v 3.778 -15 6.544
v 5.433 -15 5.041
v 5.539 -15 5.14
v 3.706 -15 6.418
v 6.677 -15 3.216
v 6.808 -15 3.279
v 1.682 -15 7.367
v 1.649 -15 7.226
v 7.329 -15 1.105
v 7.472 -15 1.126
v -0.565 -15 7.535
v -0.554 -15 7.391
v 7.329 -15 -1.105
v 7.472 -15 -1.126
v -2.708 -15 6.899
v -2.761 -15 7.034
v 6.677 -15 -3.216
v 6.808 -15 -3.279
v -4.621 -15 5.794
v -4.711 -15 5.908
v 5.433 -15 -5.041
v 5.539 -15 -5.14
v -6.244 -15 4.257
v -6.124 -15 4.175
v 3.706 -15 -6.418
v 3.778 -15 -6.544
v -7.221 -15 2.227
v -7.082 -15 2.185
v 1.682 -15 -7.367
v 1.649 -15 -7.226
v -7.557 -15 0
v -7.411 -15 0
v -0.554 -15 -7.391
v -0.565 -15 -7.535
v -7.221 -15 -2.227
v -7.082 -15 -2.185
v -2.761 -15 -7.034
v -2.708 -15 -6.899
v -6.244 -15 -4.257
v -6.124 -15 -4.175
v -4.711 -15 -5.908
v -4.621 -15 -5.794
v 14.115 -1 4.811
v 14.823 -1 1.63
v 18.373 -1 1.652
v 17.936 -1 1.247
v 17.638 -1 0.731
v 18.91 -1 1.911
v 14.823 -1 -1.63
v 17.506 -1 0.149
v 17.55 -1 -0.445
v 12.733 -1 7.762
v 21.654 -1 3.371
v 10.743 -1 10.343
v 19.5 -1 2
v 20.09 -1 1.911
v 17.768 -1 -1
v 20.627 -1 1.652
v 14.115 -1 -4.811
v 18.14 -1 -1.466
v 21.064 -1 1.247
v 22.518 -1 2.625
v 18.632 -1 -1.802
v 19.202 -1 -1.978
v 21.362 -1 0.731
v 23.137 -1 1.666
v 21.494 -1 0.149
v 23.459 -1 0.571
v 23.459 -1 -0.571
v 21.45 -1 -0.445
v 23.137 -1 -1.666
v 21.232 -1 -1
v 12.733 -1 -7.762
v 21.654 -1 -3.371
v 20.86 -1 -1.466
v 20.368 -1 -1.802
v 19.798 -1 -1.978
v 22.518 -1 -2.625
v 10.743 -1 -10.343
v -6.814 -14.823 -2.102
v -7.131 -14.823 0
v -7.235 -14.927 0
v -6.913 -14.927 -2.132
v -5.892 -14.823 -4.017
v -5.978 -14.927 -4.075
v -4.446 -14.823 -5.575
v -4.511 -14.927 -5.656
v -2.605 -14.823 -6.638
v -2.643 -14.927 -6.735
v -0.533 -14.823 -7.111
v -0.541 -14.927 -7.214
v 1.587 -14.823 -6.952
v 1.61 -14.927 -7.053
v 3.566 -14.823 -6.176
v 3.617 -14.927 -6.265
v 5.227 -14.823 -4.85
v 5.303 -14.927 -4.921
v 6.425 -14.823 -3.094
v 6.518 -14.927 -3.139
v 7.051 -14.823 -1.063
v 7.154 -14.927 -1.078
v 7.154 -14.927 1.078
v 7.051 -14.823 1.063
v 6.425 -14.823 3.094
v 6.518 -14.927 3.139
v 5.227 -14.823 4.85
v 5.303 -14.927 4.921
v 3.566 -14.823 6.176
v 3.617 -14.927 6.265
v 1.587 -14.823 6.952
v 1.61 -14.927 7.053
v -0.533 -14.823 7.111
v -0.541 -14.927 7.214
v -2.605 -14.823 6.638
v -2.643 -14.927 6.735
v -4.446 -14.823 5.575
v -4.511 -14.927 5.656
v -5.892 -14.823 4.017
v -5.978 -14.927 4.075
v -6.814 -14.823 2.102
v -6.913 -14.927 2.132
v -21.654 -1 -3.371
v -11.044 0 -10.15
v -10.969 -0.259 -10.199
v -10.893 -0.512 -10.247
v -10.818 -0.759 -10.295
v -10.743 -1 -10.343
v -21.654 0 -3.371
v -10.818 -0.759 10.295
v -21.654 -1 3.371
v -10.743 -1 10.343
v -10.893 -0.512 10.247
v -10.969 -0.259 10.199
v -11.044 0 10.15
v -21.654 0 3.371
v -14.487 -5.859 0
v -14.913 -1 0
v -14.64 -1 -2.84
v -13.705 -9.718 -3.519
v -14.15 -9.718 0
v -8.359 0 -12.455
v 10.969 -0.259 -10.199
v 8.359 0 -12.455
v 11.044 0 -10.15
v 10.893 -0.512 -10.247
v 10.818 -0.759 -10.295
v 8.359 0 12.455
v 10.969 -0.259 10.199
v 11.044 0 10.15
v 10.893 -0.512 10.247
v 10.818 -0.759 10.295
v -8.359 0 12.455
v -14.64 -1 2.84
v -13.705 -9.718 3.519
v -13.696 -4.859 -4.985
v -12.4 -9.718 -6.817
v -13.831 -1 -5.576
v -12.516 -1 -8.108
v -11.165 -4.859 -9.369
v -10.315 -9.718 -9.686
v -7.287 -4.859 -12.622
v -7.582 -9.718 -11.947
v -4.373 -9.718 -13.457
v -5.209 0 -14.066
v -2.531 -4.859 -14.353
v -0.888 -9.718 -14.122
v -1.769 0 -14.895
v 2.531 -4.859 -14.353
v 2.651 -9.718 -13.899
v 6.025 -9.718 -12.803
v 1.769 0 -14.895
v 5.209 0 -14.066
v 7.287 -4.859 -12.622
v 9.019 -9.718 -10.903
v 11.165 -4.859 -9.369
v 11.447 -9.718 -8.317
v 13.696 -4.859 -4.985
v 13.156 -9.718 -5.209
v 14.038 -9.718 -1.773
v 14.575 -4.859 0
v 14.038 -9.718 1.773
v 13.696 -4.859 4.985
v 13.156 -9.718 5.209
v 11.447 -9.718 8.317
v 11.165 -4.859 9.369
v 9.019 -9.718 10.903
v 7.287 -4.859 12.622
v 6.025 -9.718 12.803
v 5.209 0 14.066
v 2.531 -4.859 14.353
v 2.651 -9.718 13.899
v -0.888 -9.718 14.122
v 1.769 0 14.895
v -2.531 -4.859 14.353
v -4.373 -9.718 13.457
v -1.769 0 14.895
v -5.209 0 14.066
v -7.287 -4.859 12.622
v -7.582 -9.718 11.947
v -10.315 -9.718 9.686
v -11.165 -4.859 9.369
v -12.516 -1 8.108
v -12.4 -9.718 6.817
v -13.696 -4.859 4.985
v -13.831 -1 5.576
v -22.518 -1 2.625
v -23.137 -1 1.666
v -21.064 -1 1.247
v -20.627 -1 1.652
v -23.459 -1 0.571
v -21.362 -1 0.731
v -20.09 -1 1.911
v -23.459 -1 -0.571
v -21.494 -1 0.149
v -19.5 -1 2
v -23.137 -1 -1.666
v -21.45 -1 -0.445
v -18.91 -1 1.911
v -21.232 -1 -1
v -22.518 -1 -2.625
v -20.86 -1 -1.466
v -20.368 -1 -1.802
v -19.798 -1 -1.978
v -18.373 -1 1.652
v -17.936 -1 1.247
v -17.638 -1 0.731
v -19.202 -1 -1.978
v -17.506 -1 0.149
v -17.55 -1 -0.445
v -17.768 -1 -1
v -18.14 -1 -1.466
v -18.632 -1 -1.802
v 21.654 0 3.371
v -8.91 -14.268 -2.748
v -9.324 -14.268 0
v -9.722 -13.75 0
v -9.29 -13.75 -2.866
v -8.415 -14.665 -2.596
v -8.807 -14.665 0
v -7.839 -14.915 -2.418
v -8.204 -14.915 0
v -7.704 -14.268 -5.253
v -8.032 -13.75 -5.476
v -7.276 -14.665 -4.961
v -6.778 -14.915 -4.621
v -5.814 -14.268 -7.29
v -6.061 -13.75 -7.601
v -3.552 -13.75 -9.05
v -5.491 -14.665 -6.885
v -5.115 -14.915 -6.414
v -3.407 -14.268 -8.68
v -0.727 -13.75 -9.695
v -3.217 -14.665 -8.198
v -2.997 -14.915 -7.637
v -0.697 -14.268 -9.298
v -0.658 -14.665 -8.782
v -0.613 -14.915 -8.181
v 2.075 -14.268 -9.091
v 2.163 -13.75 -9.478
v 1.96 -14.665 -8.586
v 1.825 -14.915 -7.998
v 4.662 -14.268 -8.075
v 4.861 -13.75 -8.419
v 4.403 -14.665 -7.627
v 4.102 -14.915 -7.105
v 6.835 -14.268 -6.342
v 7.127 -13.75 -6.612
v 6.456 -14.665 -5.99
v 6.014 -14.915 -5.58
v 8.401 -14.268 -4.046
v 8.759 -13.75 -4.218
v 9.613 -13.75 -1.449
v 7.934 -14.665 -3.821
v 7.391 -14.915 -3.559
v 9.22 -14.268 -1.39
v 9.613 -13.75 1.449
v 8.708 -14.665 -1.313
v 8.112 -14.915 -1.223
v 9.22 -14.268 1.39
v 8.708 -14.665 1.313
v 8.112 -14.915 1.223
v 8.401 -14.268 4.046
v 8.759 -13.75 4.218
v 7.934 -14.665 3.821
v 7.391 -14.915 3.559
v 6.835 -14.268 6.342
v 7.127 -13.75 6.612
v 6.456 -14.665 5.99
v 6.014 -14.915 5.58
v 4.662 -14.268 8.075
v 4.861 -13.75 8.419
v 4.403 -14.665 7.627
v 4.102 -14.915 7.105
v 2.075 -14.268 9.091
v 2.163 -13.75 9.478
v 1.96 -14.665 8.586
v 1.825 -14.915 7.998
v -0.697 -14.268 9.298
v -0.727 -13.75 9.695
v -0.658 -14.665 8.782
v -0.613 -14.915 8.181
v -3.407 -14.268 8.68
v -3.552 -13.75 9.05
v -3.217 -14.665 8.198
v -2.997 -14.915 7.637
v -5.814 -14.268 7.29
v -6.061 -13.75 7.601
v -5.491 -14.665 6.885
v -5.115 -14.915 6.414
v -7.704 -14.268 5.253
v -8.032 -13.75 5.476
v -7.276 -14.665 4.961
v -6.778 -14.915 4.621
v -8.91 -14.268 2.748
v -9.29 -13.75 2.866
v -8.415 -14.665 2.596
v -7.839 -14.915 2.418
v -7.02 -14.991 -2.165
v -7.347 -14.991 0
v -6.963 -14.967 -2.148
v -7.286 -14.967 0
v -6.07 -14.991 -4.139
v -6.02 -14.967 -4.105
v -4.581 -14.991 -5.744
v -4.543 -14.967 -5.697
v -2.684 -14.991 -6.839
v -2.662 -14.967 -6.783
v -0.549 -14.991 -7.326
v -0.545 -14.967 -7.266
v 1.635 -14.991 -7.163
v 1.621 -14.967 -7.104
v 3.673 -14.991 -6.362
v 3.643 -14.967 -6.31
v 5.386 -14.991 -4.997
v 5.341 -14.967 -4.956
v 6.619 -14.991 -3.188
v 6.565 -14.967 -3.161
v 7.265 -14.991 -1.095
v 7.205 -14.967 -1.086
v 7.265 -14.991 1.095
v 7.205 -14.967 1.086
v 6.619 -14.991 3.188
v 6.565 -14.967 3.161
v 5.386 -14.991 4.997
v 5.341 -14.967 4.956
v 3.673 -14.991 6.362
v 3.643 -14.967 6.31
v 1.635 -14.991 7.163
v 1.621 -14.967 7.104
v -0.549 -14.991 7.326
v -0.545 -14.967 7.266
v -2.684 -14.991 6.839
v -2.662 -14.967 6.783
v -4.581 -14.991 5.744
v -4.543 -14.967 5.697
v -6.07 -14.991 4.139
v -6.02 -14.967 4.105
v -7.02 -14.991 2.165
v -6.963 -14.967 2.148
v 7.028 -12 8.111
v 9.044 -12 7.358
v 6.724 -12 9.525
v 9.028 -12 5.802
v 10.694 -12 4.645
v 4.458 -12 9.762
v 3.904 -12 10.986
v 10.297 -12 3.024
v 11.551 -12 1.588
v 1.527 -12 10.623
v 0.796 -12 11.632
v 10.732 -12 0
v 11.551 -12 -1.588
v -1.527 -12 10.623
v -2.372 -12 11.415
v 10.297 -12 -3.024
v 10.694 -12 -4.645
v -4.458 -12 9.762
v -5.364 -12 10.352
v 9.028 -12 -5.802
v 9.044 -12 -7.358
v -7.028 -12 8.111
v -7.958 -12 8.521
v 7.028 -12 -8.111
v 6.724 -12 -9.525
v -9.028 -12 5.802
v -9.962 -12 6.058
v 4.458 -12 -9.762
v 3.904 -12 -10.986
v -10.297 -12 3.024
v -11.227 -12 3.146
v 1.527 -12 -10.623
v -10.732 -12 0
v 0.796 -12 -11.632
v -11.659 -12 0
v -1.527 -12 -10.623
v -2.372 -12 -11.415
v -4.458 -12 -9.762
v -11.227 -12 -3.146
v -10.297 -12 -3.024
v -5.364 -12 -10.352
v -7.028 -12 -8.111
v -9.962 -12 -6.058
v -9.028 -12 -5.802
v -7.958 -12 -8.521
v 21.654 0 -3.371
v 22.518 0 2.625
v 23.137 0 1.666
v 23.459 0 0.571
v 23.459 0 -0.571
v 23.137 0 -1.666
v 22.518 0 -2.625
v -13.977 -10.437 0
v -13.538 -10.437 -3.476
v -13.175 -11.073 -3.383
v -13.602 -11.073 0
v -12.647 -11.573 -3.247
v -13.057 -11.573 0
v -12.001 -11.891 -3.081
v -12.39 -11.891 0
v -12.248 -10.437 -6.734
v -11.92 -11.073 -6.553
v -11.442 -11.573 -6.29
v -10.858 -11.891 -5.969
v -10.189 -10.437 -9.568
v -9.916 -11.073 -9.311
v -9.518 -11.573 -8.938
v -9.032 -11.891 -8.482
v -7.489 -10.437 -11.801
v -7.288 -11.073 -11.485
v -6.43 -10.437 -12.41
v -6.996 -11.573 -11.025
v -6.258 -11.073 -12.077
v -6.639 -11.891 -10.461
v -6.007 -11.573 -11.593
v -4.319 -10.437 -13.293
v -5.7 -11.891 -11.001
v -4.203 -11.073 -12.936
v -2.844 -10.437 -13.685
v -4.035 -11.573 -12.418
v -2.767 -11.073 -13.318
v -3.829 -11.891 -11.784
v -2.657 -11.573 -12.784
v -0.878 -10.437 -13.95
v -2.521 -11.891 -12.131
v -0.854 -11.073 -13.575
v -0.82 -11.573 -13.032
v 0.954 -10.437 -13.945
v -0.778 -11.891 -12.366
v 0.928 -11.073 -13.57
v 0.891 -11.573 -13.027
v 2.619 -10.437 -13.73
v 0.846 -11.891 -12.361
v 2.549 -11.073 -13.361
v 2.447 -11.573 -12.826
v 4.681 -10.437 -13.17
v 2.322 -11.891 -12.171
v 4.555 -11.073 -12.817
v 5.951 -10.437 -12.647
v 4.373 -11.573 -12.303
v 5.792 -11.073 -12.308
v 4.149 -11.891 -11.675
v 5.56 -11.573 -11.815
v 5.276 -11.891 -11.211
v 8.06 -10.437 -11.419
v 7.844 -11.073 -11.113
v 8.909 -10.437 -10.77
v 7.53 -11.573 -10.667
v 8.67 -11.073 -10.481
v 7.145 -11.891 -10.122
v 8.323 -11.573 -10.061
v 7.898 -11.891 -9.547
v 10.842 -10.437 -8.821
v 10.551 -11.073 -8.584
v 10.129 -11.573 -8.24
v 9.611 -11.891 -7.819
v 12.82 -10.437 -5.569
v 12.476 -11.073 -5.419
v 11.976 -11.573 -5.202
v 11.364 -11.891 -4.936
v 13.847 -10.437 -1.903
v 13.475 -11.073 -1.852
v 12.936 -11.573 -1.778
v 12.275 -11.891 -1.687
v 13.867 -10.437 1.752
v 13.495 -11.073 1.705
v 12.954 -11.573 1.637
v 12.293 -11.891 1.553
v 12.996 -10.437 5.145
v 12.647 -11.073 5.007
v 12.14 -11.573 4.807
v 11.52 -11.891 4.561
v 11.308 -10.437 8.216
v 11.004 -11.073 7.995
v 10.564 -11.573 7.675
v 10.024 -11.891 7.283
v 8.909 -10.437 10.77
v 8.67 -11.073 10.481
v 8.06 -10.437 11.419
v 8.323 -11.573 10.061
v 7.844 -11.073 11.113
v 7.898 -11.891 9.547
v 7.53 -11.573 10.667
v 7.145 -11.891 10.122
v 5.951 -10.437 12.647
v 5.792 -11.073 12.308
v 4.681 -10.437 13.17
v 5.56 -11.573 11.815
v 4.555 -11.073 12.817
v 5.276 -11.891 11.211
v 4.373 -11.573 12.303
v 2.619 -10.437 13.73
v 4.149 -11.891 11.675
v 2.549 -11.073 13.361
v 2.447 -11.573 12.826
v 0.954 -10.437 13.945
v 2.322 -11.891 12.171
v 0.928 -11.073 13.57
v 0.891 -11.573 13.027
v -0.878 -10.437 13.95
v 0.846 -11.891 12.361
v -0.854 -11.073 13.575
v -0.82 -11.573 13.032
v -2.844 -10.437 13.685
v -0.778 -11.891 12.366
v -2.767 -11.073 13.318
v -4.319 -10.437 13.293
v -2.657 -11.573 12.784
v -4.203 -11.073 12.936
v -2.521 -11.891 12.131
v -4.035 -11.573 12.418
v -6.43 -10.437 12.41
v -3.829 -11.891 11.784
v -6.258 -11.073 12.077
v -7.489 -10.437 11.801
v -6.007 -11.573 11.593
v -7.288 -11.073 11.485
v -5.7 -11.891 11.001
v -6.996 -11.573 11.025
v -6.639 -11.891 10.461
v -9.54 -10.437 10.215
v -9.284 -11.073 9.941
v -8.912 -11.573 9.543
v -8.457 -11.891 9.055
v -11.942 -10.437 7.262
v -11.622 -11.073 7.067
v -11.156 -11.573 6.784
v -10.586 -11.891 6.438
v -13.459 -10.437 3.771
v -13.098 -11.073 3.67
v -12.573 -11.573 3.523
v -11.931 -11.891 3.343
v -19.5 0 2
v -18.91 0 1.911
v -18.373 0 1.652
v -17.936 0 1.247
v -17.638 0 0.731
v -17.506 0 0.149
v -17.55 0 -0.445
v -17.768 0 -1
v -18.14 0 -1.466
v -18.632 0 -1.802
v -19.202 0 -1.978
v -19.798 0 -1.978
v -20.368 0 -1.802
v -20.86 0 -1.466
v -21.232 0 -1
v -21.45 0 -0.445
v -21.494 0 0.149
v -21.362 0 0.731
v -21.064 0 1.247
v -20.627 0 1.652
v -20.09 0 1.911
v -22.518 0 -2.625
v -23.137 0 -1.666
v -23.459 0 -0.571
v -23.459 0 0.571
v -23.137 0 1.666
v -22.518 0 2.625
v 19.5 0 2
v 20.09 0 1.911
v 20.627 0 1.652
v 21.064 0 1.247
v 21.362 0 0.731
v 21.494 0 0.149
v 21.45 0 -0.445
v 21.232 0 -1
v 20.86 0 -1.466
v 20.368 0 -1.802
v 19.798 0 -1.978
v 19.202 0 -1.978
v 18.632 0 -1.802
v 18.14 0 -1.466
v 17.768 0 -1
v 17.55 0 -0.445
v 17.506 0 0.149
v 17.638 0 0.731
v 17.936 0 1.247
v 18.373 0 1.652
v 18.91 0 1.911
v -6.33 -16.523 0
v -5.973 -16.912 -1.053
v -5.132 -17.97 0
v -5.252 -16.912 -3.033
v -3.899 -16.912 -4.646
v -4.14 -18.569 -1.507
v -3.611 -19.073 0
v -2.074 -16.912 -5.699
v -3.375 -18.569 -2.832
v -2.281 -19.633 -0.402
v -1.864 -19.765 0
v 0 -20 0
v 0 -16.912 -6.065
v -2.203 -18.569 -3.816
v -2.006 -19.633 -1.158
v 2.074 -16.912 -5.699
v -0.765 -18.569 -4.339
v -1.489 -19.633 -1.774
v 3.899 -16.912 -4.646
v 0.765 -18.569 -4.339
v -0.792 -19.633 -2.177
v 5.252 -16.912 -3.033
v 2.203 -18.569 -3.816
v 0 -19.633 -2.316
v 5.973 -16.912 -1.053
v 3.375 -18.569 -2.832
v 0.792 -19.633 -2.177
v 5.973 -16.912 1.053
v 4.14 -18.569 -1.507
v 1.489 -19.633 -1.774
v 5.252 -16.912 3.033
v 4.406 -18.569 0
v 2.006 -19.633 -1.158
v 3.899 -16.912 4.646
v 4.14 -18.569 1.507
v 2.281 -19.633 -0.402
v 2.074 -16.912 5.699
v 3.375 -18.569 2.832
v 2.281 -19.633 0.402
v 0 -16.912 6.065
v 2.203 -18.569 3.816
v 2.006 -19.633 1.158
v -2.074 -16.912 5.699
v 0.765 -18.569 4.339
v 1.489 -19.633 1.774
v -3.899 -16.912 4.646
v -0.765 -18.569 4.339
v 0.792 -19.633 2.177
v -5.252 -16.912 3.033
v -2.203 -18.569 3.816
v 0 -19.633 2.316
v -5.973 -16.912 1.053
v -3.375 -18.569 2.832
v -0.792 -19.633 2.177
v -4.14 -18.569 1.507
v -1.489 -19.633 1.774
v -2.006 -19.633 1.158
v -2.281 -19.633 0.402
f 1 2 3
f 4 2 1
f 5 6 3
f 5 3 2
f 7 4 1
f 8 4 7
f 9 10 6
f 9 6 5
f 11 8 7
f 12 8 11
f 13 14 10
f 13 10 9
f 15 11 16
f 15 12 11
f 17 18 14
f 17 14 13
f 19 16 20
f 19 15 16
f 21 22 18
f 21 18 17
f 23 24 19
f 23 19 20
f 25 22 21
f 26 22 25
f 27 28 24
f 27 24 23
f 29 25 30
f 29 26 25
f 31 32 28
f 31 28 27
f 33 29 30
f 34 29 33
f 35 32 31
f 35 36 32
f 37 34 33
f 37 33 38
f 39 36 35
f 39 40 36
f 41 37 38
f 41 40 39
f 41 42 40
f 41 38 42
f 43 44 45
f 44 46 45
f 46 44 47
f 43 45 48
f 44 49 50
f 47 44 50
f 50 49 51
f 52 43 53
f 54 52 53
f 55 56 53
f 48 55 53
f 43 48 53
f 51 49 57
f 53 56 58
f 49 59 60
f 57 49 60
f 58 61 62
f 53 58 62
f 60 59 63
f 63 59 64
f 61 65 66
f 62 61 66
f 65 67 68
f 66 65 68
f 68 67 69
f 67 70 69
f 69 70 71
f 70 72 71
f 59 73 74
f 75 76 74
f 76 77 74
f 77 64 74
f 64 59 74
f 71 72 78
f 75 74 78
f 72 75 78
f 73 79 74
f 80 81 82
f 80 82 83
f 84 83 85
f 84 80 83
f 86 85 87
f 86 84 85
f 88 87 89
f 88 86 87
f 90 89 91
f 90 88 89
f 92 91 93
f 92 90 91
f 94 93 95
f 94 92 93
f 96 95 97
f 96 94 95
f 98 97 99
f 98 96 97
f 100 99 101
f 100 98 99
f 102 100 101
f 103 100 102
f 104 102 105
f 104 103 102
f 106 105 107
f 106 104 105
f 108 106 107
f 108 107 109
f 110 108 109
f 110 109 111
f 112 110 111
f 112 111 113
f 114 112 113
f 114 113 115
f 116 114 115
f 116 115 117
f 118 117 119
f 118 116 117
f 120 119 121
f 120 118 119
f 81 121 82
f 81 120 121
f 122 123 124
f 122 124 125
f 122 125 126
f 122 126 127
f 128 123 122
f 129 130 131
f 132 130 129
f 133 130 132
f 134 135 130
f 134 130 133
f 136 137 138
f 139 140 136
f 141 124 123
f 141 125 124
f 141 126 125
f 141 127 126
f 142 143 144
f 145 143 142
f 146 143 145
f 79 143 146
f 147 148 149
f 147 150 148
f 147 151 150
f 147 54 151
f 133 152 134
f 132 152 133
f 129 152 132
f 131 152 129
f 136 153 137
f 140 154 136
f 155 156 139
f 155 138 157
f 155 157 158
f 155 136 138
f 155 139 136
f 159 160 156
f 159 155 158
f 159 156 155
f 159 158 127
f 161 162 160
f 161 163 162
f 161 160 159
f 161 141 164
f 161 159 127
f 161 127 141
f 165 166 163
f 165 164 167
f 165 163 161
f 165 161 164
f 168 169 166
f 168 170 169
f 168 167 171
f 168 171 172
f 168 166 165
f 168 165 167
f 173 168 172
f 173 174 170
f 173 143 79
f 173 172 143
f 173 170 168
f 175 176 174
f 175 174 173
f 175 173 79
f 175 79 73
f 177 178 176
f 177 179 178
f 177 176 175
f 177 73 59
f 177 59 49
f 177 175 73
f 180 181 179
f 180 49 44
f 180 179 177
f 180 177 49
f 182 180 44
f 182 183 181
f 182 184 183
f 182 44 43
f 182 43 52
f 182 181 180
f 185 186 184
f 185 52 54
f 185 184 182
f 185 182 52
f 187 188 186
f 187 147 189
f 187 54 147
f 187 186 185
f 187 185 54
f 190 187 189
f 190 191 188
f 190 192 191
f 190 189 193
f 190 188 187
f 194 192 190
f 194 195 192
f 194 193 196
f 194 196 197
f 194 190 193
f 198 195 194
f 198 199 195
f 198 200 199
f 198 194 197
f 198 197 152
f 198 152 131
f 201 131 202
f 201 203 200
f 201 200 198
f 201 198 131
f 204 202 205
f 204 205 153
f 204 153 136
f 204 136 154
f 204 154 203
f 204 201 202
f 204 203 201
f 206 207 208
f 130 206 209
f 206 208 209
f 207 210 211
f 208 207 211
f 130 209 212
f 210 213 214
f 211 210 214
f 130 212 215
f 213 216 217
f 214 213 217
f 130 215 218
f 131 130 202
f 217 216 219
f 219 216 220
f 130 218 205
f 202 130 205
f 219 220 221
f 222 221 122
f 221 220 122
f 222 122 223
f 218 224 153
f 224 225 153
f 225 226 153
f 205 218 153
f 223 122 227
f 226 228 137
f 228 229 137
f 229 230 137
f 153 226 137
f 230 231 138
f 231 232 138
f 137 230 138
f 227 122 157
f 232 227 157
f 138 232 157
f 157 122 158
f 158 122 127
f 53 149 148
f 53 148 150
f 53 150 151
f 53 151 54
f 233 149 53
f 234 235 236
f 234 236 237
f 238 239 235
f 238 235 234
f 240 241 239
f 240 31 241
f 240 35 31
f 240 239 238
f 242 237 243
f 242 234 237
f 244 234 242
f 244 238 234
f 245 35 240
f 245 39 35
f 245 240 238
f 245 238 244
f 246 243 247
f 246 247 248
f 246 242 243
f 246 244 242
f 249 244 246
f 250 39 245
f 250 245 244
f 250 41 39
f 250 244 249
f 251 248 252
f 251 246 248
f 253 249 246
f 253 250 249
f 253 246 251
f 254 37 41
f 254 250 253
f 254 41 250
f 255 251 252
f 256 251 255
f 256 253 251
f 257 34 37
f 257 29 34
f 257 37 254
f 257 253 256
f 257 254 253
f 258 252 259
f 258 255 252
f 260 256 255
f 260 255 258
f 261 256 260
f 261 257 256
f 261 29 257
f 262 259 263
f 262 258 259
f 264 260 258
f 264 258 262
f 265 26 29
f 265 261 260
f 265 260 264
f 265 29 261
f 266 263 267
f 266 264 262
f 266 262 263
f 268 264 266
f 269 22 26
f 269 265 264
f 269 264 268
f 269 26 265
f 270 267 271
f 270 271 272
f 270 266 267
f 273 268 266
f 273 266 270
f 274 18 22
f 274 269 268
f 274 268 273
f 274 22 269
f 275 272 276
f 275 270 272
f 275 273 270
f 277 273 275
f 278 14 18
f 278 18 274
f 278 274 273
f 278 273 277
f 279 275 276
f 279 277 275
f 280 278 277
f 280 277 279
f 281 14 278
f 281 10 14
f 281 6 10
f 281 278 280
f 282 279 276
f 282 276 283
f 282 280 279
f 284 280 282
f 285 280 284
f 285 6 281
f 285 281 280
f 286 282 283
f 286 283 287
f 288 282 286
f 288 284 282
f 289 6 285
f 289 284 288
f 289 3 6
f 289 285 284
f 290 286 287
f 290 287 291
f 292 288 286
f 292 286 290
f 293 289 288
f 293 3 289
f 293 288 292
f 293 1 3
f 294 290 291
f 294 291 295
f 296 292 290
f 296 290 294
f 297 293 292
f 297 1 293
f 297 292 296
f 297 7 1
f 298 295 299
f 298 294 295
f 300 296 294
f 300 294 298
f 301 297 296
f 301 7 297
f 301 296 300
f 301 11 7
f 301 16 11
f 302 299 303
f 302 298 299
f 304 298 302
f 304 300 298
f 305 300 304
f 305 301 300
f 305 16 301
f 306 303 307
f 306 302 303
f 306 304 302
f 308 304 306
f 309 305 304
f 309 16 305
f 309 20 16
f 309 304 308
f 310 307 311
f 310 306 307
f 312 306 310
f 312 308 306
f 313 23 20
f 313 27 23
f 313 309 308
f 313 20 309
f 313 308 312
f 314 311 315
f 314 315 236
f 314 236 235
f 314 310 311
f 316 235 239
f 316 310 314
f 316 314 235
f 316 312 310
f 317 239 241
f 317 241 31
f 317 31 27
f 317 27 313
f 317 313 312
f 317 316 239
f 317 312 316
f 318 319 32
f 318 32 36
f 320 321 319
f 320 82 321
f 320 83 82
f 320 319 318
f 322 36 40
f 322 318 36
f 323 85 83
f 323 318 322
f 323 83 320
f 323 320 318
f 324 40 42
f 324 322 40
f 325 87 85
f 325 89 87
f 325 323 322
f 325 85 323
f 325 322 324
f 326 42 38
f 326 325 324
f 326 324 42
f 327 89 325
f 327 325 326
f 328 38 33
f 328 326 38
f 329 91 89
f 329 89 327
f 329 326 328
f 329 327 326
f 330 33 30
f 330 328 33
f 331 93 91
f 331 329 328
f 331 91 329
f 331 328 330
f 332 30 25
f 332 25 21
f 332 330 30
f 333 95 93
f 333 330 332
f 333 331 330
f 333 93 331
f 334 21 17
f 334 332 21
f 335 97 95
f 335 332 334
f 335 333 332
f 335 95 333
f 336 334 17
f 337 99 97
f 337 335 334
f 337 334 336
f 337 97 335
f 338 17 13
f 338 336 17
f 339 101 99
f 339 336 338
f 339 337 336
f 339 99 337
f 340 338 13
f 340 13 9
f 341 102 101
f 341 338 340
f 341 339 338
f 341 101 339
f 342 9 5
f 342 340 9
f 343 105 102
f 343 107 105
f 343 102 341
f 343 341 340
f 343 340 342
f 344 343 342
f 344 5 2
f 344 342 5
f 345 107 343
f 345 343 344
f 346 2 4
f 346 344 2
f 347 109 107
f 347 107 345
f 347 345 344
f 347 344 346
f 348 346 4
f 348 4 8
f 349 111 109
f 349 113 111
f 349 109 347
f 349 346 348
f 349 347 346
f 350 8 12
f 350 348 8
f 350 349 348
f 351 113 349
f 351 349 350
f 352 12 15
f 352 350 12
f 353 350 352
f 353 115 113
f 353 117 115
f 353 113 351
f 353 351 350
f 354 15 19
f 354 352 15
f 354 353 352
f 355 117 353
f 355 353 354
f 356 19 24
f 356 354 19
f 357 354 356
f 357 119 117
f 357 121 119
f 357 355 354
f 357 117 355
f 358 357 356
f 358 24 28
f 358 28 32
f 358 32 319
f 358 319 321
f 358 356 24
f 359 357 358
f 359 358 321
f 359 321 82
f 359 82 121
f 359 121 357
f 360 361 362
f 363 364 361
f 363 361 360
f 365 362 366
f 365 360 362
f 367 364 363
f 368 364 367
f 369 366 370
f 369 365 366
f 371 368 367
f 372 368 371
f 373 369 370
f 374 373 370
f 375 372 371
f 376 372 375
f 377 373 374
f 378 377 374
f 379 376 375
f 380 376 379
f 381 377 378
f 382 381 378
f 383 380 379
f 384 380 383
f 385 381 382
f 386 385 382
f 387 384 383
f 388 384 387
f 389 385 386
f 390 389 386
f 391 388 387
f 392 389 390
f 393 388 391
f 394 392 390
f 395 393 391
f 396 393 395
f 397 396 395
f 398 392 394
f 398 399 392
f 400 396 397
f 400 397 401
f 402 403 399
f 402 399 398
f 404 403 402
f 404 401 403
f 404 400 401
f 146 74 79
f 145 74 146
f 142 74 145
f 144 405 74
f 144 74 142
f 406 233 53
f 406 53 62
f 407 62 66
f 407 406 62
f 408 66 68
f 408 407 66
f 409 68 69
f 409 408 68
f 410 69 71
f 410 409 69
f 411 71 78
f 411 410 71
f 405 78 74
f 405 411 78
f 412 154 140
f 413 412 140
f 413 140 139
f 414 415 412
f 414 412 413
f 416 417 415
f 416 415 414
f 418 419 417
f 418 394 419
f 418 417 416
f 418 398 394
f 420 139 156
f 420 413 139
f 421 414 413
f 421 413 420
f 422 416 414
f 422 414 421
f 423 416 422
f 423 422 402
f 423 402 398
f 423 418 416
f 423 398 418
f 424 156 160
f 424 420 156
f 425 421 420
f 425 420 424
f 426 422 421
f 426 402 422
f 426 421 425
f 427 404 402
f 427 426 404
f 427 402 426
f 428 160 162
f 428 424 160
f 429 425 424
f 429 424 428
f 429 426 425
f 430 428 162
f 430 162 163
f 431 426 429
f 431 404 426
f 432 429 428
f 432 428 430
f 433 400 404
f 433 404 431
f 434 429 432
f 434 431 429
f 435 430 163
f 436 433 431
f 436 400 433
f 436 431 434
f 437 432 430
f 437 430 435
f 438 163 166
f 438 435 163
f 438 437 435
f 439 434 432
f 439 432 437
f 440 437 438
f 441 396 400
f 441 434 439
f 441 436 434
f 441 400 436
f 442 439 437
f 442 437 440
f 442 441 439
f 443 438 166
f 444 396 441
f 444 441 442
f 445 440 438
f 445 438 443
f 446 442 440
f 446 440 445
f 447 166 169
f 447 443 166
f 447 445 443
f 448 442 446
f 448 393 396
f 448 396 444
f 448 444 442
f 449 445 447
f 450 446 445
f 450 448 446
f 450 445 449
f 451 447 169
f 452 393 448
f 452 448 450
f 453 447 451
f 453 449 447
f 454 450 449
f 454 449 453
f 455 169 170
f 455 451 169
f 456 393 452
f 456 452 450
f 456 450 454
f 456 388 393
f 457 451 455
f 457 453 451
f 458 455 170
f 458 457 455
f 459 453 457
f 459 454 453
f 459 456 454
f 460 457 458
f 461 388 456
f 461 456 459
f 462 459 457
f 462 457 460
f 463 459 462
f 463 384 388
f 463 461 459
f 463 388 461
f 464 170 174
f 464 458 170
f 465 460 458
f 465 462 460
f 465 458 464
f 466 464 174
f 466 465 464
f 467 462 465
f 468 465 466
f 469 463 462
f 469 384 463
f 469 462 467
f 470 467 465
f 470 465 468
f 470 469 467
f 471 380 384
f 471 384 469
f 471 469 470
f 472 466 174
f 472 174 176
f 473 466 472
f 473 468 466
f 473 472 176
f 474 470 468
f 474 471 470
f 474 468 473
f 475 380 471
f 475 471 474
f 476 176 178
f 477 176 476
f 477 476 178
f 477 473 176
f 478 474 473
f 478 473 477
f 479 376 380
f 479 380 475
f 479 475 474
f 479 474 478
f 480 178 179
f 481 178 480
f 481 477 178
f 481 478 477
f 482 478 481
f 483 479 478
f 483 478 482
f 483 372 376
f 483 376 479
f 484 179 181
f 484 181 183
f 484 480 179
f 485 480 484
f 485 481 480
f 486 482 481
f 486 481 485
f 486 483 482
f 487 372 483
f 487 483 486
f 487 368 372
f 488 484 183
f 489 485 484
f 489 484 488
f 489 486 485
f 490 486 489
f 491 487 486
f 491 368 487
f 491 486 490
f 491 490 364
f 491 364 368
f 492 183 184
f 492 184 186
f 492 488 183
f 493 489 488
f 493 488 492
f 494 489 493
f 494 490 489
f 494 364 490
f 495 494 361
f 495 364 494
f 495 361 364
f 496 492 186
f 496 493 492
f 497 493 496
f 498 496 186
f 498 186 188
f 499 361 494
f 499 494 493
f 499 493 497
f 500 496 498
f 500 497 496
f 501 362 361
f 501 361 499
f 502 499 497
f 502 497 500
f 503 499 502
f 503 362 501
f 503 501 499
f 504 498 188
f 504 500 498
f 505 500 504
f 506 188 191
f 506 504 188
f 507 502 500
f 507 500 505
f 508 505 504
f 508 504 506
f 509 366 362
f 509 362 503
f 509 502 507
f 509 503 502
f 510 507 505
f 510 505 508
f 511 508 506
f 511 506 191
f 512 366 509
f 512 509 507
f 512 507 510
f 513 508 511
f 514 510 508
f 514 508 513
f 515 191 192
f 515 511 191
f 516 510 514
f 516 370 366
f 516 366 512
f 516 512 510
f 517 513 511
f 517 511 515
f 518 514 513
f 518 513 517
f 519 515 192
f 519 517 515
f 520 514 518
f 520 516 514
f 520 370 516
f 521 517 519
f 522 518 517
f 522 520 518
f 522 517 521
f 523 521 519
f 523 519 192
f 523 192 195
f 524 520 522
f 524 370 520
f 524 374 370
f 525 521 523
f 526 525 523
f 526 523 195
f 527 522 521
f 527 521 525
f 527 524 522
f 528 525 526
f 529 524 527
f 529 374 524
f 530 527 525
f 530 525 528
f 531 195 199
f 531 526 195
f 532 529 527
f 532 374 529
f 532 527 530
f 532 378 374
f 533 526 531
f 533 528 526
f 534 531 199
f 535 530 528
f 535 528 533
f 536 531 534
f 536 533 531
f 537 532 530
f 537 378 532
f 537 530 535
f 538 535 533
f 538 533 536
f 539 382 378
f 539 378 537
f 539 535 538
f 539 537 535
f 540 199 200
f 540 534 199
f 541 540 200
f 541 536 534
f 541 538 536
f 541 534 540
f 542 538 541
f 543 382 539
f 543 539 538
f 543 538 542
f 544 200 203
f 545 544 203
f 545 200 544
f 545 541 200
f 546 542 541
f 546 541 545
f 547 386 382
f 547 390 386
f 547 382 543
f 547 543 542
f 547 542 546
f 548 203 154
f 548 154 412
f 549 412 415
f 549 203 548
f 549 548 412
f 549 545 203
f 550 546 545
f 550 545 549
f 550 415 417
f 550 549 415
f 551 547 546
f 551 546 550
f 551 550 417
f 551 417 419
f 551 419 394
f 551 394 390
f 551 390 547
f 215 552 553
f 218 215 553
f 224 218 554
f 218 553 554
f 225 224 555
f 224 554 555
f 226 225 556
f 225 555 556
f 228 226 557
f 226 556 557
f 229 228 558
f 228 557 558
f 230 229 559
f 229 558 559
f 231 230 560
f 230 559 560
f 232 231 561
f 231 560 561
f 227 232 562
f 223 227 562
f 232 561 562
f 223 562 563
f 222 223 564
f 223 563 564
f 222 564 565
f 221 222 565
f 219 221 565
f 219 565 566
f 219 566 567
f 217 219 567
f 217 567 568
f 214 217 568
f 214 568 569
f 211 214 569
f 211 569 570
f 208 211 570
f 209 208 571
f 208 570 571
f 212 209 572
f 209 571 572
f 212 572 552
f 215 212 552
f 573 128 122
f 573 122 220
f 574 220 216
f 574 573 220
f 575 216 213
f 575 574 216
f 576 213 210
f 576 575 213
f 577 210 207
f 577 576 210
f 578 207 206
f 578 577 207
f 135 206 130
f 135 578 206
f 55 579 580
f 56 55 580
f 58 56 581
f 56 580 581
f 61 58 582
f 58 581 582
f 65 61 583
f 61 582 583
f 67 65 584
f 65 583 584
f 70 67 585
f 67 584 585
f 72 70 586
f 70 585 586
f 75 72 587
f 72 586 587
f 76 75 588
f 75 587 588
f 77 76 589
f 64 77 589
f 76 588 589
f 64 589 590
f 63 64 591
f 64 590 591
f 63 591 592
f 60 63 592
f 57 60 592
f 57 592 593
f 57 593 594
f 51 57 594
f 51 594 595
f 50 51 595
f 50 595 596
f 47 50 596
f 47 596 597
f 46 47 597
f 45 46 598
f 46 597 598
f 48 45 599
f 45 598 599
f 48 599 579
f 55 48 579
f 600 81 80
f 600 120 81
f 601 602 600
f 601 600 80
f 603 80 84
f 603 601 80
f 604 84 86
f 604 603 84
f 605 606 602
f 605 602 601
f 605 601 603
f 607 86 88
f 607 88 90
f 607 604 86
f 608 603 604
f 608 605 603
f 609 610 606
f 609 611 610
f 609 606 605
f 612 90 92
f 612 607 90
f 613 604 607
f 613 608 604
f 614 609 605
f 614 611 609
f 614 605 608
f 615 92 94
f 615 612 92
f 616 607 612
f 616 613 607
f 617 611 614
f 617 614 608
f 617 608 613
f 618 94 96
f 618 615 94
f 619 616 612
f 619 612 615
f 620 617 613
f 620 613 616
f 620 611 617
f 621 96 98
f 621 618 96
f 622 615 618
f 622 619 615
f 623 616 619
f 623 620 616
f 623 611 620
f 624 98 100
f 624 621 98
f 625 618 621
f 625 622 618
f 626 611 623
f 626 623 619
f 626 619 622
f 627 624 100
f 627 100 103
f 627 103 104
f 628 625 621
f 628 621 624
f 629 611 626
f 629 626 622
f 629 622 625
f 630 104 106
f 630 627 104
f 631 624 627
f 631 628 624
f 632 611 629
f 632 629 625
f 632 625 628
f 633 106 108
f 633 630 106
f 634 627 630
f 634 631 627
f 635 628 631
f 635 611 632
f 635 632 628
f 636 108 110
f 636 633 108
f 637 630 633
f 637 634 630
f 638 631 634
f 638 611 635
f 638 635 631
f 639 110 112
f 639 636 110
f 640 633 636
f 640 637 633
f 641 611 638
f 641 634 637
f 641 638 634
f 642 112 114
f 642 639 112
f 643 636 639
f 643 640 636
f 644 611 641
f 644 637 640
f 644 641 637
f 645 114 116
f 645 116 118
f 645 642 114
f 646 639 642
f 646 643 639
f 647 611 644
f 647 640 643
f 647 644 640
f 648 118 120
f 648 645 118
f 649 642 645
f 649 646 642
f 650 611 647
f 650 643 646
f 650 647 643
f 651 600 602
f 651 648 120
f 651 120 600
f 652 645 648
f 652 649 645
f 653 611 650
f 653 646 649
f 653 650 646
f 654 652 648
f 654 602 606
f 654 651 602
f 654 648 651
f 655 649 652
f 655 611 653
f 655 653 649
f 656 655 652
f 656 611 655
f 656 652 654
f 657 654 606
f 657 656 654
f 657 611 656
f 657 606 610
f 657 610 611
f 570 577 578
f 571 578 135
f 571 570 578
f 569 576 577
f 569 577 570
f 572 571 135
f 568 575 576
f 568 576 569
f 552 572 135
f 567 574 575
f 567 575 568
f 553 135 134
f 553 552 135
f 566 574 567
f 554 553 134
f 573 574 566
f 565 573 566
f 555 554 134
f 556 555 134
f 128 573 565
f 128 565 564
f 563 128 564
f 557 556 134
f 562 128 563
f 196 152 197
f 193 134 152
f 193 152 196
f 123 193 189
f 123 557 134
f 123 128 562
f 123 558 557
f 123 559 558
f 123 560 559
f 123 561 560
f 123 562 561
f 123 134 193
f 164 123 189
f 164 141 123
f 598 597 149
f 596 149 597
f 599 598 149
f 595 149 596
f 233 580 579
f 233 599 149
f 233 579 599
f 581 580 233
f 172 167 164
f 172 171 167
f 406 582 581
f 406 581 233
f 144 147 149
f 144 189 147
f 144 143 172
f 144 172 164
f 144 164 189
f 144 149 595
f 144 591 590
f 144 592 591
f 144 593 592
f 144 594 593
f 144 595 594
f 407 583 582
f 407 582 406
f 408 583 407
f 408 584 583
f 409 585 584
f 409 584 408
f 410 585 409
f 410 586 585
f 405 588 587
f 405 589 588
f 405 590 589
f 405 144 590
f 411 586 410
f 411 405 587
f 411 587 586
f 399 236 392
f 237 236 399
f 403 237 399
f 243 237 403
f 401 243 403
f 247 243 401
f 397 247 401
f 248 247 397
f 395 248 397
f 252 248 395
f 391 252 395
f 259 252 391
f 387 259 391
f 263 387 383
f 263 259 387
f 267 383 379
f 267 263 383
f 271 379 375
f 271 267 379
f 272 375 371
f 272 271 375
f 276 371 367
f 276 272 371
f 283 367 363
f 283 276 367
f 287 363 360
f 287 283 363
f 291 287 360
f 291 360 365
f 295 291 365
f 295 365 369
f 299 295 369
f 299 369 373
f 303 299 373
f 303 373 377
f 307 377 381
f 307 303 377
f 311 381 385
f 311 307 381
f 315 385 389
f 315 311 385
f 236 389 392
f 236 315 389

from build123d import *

# Parameters (mm, degrees)
FILLET1_R           = 2.5
SKETCH1_R           = 2
BOSS_EXTRUDE1_DEPTH = 1
FILLET2_R           = 0.25


with BuildPart() as part:
    # Sketch2 one side → Revolve1 (revolve)
    with BuildSketch(Plane.XY):
        with BuildLine():
            Line((0, -20), (0, -5))
            Line((0, -5), (0, 0))
            Line((0, 0), (-15, 0))
            Line((-15, 0), (-13.950136038, -12))
            Line((-13.950136038, -12), (-10.732050808, -12))
            Line((-10.732050808, -12), (-9, -15))
            Line((-9, -15), (-7.307879939, -15))
            Line((-7.307879939, -15), (-7.131103244, -14.823223305))
            ThreePointArc((-7.131103244, -14.823223305), (-4.406008694, -18.569356423), (0, -20))
        make_face()
    revolve(axis=Axis((0, 0, 0), (0, -1, 0)))

    # Fillet1
    fillet1_edges = [part.edges().sort_by_distance(p)[0] for p in [
        (9, -15, 0),
        (13.950136038, -12, 0),
    ]]
    fillet(fillet1_edges, radius=FILLET1_R)

    # Sketch1 → Boss-Extrude1 (add)
    # profile 1 of 2: a face of its own
    with BuildSketch(Plane(origin=(0, 0, 0), x_dir=(1, 0, 0), z_dir=(0, 1, 0))):
        with BuildLine():
            ThreePointArc((-21.653846154, 3.370600354), (-23.5, 0), (-21.653846154, -3.370600354))
            Line((-21.653846154, -3.370600354), (-7.807692308, -12.218426283))
            ThreePointArc((-7.807692308, -12.218426283), (-14.5, 0), (-7.807692308, 12.218426283))
            Line((-7.807692308, 12.218426283), (-21.653846154, 3.370600354))
        make_face()
        with Locations(Location((-19.5, 0, 0), (0, 0, 270))):
            Circle(SKETCH1_R, mode=Mode.SUBTRACT)
    # profile 2 of 2: a face of its own
    with BuildSketch(Plane(origin=(0, 0, 0), x_dir=(1, 0, 0), z_dir=(0, 1, 0))):
        with BuildLine():
            Line((21.653846154, 3.370600354), (7.807692308, 12.218426283))
            ThreePointArc((7.807692308, 12.218426283), (14.5, 0), (7.807692308, -12.218426283))
            Line((7.807692308, -12.218426283), (21.653846154, -3.370600354))
            ThreePointArc((21.653846154, -3.370600354), (23.5, 0), (21.653846154, 3.370600354))
        make_face()
        with Locations(Location((19.5, 0, 0), (0, 0, 270))):
            Circle(SKETCH1_R, mode=Mode.SUBTRACT)
    extrude(amount=-BOSS_EXTRUDE1_DEPTH)

    # Fillet2
    fillet2_edges = [part.edges().sort_by_distance(p)[0] for p in [
        (7.307879939, -15, 0),
    ]]
    fillet(fillet2_edges, radius=FILLET2_R)


solid = part.part
